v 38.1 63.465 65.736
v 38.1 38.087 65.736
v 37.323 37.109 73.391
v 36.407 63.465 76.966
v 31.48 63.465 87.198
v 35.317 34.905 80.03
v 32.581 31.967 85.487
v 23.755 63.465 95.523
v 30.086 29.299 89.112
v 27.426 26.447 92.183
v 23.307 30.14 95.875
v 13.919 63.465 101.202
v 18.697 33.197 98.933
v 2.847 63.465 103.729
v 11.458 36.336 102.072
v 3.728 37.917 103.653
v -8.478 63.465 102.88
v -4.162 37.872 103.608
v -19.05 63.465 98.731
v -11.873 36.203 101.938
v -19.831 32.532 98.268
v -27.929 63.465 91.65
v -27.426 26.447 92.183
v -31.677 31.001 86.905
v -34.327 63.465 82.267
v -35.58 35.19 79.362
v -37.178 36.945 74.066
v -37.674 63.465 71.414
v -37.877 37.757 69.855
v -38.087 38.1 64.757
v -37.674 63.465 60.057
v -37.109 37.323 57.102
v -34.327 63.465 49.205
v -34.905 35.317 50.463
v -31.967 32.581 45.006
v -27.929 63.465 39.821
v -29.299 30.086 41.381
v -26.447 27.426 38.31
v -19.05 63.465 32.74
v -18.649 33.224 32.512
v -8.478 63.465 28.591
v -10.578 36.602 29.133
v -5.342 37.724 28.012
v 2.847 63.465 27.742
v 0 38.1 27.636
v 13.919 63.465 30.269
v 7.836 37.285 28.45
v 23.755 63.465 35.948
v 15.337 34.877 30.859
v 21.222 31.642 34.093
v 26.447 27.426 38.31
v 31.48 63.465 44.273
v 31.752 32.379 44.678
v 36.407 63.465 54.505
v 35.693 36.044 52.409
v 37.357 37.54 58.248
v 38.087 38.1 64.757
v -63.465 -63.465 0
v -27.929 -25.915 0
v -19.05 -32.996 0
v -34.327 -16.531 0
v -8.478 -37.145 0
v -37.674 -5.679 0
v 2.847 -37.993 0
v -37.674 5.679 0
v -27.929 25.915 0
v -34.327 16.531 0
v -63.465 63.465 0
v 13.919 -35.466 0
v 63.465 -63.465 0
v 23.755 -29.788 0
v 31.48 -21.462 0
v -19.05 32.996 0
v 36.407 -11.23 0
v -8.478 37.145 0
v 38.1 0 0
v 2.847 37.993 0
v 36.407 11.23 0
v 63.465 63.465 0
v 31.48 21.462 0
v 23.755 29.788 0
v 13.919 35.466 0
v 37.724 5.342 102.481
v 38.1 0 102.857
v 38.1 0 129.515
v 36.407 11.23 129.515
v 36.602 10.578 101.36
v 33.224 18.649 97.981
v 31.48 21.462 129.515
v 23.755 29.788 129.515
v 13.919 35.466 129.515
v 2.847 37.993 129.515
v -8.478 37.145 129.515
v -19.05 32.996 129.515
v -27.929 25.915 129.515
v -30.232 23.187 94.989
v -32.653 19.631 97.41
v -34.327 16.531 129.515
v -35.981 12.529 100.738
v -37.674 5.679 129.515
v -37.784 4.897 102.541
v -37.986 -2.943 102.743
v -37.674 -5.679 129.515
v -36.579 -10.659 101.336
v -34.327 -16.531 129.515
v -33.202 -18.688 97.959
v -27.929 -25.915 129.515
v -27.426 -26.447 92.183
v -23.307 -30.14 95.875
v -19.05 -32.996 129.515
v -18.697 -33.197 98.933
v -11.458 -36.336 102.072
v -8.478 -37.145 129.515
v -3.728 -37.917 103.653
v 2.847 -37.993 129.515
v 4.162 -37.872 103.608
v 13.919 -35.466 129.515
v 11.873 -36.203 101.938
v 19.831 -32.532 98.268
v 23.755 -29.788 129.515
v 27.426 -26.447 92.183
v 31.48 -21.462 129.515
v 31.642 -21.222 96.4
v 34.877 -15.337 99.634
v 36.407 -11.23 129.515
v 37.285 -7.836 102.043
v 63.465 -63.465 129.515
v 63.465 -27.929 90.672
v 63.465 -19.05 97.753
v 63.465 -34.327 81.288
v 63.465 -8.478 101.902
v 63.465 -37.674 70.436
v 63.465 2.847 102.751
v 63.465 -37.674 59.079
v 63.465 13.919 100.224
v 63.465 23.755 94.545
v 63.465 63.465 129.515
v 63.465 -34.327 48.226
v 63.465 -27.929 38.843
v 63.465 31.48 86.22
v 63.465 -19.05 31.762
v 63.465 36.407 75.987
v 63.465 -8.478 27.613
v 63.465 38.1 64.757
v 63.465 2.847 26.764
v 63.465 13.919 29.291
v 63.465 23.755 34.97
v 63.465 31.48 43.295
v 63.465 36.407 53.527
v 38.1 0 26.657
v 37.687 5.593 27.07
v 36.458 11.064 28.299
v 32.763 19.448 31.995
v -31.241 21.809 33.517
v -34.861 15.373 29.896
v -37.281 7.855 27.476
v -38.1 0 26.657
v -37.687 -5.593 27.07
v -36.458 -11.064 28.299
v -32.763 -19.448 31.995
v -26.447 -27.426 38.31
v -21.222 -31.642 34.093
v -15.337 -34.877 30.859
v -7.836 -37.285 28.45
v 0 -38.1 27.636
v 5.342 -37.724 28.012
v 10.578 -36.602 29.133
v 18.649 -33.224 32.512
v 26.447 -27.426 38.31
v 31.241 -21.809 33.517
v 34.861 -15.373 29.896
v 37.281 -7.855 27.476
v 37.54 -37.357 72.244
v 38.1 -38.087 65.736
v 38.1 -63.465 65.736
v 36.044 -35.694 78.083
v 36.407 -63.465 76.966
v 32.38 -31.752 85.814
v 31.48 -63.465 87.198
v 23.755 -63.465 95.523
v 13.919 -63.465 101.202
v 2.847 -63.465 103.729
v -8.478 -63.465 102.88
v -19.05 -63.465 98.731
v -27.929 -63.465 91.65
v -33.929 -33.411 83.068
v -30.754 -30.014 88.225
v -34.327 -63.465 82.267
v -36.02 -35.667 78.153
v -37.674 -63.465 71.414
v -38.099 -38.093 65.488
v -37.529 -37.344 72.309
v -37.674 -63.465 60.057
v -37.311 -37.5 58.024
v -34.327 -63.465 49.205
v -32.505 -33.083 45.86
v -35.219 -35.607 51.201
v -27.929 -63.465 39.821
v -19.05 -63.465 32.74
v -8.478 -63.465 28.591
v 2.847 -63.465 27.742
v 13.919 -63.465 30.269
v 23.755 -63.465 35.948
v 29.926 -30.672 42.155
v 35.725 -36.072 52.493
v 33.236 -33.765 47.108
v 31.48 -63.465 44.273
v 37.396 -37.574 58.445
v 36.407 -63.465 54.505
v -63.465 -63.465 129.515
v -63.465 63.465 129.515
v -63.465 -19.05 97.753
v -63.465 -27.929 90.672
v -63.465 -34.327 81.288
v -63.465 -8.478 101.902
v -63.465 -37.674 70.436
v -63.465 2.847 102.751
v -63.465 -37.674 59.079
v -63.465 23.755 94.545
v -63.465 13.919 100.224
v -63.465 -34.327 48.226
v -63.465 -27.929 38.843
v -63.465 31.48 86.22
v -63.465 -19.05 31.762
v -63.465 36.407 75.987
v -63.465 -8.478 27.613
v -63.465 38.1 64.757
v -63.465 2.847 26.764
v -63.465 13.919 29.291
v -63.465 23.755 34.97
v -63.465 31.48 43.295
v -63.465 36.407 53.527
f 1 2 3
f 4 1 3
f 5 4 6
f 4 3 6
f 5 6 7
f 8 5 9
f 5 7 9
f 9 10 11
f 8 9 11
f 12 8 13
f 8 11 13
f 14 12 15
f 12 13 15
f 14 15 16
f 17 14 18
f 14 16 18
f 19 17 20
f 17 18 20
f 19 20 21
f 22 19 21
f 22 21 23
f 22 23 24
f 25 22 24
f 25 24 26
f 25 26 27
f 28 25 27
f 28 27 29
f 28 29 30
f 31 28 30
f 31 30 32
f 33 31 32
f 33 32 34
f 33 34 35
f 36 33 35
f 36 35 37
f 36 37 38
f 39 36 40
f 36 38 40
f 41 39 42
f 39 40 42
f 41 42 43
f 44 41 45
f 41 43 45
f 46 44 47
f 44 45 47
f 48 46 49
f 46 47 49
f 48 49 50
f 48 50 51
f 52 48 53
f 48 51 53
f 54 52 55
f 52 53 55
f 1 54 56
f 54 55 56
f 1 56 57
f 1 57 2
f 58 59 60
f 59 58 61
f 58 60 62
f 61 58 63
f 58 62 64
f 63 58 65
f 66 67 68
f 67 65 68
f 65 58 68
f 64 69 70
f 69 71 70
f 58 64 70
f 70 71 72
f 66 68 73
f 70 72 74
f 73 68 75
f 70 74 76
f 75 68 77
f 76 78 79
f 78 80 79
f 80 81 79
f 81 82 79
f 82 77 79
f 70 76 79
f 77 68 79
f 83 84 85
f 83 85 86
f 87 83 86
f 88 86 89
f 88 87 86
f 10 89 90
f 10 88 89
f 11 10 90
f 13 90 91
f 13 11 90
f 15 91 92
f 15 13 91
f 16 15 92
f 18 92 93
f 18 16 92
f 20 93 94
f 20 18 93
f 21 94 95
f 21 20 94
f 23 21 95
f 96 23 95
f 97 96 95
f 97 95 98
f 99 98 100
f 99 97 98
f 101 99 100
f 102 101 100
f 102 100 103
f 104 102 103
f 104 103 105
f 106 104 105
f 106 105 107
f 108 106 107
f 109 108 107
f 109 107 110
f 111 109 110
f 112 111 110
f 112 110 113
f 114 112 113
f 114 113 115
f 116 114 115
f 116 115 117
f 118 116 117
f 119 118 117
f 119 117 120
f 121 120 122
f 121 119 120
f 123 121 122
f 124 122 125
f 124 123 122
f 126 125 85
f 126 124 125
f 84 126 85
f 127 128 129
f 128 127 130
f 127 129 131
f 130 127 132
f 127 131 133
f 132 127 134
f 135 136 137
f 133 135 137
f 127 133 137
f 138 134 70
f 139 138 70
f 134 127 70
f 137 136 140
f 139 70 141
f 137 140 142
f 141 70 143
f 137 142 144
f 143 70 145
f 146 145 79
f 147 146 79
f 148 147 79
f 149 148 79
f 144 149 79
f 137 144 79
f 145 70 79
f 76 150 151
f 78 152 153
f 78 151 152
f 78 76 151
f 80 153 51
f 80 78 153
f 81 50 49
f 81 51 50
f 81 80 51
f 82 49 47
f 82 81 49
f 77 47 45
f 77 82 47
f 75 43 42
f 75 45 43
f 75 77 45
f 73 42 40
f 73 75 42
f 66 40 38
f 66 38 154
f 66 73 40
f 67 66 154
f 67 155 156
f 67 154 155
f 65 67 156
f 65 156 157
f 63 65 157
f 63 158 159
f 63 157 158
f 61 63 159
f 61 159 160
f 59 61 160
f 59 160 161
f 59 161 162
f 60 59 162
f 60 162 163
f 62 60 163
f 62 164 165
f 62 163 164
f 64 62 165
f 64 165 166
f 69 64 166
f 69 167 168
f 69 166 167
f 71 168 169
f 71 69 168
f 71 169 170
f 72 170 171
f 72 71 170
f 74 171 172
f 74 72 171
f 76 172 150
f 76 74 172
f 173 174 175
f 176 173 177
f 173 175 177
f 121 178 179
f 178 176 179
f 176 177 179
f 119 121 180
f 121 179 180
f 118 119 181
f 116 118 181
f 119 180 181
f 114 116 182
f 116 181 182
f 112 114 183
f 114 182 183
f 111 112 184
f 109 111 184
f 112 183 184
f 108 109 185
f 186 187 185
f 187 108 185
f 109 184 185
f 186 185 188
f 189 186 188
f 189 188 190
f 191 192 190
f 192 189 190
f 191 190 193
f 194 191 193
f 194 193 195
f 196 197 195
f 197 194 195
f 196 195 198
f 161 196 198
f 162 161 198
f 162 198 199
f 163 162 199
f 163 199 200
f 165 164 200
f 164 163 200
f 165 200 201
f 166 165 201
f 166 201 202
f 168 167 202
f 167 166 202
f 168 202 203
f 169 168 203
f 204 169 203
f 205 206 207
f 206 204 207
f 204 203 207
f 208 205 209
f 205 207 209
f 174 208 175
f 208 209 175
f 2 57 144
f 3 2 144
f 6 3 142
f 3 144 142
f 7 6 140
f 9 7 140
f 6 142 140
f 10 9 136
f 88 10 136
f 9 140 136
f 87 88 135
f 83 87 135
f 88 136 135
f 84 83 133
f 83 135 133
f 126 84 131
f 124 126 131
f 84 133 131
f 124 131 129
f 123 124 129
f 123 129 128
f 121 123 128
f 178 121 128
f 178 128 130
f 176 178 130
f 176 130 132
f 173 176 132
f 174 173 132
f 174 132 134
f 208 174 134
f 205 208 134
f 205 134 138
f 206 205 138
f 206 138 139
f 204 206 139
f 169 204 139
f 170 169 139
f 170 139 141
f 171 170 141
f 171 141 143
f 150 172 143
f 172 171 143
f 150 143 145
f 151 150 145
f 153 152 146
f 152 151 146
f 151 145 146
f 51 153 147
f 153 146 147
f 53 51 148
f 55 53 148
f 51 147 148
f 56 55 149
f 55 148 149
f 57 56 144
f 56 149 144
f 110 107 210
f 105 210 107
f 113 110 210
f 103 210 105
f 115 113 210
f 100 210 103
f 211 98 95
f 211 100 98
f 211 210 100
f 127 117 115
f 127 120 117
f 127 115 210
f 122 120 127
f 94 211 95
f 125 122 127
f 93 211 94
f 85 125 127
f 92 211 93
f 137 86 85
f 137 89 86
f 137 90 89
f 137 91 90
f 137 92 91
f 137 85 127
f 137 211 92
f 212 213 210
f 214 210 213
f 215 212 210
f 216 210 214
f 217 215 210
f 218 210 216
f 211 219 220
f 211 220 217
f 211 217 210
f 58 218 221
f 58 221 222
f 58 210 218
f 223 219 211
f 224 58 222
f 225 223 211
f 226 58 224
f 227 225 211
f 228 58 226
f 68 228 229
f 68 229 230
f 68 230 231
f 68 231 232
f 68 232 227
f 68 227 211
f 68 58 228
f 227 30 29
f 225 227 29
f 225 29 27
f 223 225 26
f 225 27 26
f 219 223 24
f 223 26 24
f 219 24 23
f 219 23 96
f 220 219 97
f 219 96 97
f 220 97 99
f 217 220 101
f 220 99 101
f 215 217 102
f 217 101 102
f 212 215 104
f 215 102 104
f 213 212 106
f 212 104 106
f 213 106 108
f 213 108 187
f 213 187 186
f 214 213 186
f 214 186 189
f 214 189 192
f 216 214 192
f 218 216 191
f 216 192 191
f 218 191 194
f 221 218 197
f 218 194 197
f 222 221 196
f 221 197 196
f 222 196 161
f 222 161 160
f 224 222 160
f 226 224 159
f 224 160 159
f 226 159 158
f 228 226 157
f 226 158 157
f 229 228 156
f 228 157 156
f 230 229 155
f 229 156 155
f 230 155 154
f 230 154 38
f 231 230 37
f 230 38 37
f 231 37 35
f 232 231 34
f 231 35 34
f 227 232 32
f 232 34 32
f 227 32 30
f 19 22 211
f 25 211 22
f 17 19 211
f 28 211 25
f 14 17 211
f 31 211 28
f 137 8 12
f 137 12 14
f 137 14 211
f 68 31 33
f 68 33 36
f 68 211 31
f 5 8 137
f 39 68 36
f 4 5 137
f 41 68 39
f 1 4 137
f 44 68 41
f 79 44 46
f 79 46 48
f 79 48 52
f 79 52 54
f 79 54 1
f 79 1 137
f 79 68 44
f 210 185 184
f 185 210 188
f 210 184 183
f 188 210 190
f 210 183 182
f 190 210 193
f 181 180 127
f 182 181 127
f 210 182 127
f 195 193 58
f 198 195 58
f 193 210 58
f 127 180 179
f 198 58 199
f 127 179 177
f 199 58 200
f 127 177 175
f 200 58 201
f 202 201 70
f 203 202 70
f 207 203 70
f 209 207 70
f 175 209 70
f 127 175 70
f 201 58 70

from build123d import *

# Parameters (mm, degrees)
F0_W     = 126.93037
F0_H     = 126.93037
F0_R     = 38.1
F1_DEPTH = 129.5146
F2_R     = 38.1
F3_DEPTH = 129.5146
F4_R     = 38.1
F5_DEPTH = 129.5146


with BuildPart() as f1:
    # F0 (on Top) → F1 (new body)
    with BuildSketch(Plane.XY):
        Rectangle(F0_W, F0_H)
        Circle(F0_R, mode=Mode.SUBTRACT)
    extrude(amount=F1_DEPTH)

    # F2 (on face) → F3 (cut)
    with BuildSketch(Plane.XZ.offset(63.465185)):
        with Locations((0, 65.735653)):
            Circle(F2_R)
    extrude(amount=-F3_DEPTH, mode=Mode.SUBTRACT)

    # F4 (on face) → F5 (cut)
    with BuildSketch(Plane.YZ.offset(63.465185)):
        with Locations((0, 64.757302)):
            Circle(F4_R)
    extrude(amount=-F5_DEPTH, mode=Mode.SUBTRACT)


solid = f1.part
